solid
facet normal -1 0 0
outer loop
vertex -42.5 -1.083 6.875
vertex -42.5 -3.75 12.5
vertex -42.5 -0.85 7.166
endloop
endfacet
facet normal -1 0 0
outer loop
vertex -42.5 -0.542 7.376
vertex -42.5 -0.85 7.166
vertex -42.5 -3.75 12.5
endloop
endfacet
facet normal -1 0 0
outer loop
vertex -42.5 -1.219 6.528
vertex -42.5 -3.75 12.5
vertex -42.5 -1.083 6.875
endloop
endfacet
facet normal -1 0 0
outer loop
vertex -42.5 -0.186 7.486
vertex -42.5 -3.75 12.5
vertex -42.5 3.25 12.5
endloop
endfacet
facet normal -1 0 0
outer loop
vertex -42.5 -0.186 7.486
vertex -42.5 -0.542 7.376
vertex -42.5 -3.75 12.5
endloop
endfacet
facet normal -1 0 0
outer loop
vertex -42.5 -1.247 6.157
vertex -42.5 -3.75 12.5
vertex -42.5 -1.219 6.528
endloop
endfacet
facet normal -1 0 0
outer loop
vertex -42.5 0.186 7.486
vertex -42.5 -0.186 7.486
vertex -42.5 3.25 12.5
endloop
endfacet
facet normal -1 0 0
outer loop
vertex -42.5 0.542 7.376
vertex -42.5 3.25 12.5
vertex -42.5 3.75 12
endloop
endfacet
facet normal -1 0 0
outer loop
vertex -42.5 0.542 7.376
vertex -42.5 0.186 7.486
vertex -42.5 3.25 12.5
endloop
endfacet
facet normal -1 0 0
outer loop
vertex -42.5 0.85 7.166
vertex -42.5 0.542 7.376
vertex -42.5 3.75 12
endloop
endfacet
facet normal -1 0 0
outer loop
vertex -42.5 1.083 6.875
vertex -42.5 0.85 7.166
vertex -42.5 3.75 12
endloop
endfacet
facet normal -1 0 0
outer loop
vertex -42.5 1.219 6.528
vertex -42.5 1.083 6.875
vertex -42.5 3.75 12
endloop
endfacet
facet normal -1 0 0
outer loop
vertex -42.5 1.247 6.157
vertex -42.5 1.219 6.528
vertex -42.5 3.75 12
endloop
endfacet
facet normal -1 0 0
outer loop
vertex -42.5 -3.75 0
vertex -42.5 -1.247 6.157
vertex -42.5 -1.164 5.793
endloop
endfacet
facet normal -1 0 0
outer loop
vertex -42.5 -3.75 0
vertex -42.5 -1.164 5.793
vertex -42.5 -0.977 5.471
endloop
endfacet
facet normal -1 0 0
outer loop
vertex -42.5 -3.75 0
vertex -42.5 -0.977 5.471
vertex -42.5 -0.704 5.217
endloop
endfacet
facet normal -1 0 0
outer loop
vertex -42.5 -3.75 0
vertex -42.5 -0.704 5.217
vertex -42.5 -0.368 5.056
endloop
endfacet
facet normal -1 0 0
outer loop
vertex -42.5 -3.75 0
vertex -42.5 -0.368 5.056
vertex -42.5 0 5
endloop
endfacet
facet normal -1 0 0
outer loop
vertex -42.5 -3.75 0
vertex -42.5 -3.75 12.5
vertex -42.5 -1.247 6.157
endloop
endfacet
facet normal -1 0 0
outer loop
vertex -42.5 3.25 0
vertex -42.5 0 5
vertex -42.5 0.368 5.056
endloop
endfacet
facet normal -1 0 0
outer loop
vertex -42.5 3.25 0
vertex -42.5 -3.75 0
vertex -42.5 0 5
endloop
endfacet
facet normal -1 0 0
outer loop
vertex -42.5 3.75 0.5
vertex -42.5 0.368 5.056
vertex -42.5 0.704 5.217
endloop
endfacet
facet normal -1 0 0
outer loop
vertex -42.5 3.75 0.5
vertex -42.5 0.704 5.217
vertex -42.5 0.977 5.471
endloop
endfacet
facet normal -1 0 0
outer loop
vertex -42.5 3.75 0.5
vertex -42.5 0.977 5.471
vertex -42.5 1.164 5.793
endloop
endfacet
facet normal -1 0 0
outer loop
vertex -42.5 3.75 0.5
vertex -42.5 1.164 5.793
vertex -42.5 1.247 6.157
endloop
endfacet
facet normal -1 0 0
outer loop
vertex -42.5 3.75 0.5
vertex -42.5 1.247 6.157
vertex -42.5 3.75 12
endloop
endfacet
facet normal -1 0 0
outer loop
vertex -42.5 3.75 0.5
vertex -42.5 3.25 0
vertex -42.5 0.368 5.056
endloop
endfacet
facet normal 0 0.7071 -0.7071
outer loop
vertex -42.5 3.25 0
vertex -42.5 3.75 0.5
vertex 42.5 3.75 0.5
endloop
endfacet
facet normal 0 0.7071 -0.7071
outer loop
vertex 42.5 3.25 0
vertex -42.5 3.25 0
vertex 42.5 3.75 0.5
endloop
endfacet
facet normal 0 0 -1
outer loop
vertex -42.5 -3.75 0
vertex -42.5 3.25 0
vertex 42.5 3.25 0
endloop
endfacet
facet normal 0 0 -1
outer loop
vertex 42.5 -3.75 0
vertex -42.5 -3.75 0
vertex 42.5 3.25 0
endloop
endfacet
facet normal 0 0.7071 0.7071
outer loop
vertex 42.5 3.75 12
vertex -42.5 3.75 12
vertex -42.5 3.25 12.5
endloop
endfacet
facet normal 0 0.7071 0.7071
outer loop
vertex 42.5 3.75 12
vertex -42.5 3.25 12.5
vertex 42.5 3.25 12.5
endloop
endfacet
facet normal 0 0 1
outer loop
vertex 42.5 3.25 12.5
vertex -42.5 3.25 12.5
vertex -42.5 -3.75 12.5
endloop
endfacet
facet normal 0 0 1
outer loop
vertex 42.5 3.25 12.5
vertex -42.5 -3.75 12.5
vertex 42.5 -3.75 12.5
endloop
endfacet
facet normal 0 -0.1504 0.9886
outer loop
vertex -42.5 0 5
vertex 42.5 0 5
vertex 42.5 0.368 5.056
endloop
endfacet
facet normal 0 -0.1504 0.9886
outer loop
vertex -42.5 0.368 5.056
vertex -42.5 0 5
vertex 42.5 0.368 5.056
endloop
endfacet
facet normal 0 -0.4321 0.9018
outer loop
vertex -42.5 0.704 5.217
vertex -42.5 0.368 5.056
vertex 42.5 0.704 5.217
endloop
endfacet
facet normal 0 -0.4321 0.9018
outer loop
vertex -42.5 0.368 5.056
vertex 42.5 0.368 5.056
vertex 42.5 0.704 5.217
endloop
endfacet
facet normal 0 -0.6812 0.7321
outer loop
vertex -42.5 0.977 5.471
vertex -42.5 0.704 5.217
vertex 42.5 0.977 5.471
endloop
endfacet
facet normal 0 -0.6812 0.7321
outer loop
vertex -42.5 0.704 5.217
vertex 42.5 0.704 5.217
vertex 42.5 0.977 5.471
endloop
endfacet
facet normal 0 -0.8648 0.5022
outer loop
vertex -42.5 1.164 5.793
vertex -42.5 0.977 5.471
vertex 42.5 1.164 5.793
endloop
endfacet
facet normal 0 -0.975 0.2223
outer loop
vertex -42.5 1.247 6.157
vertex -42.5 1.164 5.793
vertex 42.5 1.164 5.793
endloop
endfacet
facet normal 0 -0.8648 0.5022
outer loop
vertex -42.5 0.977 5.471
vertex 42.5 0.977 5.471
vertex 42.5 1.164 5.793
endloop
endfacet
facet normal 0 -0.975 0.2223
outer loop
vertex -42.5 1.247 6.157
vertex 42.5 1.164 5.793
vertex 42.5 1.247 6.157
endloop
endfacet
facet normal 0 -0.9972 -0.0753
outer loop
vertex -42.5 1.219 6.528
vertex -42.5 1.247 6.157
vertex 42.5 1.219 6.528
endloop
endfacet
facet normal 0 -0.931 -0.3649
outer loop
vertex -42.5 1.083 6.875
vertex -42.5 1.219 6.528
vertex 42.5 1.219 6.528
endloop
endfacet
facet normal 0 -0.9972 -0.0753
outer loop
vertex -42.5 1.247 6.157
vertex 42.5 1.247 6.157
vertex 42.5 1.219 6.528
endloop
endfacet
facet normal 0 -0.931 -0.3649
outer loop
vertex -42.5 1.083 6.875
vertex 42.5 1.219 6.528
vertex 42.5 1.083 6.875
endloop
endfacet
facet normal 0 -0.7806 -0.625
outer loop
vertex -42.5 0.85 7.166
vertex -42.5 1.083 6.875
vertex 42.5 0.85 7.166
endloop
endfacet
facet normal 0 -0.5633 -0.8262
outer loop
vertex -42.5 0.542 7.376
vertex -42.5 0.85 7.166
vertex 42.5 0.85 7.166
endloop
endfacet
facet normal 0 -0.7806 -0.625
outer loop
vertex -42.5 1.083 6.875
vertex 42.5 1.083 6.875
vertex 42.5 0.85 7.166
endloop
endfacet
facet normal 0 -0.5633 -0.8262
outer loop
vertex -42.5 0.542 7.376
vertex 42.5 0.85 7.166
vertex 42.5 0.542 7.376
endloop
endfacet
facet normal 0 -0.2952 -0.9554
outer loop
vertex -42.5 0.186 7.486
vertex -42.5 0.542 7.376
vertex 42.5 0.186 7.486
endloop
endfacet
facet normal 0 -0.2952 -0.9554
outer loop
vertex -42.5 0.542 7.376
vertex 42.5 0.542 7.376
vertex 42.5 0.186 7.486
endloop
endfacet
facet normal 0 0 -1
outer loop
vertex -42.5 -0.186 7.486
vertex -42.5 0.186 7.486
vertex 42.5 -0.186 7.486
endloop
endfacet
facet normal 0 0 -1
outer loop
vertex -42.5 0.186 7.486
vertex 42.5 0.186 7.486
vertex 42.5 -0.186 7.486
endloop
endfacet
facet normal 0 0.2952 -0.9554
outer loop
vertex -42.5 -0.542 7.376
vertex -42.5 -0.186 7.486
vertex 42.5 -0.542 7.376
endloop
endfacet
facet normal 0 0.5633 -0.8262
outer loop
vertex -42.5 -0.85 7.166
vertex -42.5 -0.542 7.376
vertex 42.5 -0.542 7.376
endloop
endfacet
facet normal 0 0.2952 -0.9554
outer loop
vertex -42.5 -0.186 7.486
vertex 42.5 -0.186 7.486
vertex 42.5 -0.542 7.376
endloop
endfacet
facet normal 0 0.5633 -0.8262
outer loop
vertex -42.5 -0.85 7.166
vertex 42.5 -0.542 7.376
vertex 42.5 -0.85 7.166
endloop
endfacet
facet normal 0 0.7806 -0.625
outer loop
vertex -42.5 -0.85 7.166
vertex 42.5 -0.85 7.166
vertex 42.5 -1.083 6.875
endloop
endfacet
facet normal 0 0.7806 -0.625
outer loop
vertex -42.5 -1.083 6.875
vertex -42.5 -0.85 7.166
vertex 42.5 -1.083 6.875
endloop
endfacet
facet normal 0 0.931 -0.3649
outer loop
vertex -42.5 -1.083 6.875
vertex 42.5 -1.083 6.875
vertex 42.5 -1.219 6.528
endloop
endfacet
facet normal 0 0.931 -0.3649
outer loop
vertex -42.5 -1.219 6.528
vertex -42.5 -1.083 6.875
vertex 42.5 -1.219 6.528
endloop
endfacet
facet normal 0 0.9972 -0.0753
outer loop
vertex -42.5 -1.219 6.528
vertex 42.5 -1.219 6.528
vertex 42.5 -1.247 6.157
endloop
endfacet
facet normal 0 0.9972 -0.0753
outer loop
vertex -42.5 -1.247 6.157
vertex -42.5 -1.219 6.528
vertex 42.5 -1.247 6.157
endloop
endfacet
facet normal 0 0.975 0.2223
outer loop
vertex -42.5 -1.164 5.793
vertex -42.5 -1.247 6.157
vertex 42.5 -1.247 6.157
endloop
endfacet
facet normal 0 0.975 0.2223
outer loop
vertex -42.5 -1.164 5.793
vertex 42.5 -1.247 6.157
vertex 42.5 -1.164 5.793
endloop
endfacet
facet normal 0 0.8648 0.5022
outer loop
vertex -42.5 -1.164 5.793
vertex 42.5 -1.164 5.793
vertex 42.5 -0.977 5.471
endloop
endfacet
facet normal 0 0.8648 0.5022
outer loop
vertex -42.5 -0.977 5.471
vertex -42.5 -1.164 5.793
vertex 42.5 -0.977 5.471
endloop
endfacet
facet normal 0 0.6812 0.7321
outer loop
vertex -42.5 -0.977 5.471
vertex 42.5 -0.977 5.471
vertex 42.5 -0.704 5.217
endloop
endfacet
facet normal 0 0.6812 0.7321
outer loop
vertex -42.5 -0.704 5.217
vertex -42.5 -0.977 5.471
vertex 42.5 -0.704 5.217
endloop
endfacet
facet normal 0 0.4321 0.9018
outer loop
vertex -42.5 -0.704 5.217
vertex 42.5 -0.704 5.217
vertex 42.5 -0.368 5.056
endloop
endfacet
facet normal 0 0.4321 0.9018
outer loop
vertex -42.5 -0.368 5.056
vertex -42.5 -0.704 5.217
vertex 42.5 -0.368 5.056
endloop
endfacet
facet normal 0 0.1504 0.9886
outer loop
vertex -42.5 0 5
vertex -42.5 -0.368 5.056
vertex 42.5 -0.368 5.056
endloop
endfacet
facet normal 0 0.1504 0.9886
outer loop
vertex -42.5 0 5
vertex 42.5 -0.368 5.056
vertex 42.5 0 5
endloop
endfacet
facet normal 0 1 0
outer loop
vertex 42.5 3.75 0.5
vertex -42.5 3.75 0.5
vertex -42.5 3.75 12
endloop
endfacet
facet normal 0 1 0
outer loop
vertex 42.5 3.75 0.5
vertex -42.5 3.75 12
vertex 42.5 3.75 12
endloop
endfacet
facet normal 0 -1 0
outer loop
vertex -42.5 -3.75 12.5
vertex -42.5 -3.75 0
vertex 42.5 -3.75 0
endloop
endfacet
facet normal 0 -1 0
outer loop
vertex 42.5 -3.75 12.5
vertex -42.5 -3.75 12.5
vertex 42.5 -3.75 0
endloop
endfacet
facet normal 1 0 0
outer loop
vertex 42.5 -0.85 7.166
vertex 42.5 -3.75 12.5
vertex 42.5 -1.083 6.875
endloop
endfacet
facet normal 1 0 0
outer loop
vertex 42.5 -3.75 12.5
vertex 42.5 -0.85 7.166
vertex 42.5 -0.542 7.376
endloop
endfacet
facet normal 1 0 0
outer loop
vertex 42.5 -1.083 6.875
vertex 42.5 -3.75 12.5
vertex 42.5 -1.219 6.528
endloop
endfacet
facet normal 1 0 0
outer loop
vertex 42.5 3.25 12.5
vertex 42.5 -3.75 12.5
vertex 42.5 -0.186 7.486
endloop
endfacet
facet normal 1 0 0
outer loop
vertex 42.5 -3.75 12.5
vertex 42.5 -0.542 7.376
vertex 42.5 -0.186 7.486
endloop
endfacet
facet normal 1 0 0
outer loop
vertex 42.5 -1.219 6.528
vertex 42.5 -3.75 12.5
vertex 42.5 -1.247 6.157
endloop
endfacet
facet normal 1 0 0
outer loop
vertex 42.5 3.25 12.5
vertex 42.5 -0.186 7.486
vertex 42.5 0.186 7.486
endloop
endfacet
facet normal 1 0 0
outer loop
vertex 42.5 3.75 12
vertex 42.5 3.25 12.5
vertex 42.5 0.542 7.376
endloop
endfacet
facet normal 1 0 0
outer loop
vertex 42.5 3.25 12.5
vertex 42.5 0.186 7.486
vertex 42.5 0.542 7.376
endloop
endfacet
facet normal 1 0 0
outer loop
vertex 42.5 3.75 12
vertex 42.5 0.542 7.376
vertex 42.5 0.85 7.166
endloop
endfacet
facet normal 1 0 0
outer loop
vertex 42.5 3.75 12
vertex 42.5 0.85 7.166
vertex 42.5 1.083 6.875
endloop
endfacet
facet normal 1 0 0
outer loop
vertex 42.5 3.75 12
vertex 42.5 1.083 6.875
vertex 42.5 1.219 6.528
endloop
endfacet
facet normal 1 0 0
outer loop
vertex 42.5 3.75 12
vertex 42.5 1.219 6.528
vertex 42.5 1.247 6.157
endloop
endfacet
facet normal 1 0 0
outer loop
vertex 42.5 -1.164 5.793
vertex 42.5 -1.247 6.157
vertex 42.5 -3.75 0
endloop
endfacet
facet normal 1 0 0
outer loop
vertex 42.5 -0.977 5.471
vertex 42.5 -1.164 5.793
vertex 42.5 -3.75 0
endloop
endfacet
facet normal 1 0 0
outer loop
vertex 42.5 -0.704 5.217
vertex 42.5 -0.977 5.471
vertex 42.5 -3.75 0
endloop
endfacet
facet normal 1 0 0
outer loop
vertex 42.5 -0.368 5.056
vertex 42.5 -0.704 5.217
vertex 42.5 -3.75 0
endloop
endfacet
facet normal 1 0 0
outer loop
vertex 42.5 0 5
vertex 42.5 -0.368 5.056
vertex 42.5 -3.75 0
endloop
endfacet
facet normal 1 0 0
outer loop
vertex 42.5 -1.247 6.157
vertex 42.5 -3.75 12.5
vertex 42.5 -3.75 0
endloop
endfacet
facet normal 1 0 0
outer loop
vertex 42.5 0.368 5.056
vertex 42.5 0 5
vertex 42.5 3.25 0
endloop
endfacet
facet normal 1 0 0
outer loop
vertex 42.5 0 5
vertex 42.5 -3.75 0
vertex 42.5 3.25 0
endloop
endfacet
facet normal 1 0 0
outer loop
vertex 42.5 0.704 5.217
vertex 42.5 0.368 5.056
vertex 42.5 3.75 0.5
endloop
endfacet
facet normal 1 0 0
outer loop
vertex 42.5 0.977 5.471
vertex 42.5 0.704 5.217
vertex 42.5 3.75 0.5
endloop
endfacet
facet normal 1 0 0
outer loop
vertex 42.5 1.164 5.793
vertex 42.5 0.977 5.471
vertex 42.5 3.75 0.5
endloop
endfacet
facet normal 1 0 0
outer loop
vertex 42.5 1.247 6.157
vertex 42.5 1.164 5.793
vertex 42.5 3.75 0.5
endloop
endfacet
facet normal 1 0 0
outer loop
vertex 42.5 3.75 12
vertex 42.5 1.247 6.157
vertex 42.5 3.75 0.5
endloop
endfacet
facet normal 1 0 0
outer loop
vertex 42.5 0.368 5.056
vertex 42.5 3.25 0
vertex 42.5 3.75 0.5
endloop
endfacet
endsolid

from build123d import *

# Parameters (mm, degrees)
SKETCH_1_W          = 85
SKETCH_1_H          = 7.5
EXTRUDE_1_DEPTH     = 12.5
SKETCH_2_R          = 1.25
CUT_EXTRUDE_1_DEPTH = 86.996002814
CHAMFER_1_SIZE      = 0.5


with BuildPart() as part:
    # 草图1 → 凸台-拉伸1 (new body)
    with BuildSketch(Plane.XY):
        Rectangle(SKETCH_1_W, SKETCH_1_H)
    extrude(amount=EXTRUDE_1_DEPTH)

    # 草图2 → 切除-拉伸1 (cut, through all)
    with BuildSketch(Plane(origin=(42.5, 0, 0), x_dir=(0, 0, -1), z_dir=(1, 0, 0))):
        with Locations((-6.25, 0)):
            Circle(SKETCH_2_R)
    extrude(amount=-CUT_EXTRUDE_1_DEPTH, mode=Mode.SUBTRACT)

    # 倒角1
    chamfer_1_edges = [part.edges().sort_by_distance(p)[0] for p in [
        (0, 3.75, 12.5),
        (0, 3.75, 0),
    ]]
    chamfer(chamfer_1_edges, length=CHAMFER_1_SIZE)


solid = part.part
